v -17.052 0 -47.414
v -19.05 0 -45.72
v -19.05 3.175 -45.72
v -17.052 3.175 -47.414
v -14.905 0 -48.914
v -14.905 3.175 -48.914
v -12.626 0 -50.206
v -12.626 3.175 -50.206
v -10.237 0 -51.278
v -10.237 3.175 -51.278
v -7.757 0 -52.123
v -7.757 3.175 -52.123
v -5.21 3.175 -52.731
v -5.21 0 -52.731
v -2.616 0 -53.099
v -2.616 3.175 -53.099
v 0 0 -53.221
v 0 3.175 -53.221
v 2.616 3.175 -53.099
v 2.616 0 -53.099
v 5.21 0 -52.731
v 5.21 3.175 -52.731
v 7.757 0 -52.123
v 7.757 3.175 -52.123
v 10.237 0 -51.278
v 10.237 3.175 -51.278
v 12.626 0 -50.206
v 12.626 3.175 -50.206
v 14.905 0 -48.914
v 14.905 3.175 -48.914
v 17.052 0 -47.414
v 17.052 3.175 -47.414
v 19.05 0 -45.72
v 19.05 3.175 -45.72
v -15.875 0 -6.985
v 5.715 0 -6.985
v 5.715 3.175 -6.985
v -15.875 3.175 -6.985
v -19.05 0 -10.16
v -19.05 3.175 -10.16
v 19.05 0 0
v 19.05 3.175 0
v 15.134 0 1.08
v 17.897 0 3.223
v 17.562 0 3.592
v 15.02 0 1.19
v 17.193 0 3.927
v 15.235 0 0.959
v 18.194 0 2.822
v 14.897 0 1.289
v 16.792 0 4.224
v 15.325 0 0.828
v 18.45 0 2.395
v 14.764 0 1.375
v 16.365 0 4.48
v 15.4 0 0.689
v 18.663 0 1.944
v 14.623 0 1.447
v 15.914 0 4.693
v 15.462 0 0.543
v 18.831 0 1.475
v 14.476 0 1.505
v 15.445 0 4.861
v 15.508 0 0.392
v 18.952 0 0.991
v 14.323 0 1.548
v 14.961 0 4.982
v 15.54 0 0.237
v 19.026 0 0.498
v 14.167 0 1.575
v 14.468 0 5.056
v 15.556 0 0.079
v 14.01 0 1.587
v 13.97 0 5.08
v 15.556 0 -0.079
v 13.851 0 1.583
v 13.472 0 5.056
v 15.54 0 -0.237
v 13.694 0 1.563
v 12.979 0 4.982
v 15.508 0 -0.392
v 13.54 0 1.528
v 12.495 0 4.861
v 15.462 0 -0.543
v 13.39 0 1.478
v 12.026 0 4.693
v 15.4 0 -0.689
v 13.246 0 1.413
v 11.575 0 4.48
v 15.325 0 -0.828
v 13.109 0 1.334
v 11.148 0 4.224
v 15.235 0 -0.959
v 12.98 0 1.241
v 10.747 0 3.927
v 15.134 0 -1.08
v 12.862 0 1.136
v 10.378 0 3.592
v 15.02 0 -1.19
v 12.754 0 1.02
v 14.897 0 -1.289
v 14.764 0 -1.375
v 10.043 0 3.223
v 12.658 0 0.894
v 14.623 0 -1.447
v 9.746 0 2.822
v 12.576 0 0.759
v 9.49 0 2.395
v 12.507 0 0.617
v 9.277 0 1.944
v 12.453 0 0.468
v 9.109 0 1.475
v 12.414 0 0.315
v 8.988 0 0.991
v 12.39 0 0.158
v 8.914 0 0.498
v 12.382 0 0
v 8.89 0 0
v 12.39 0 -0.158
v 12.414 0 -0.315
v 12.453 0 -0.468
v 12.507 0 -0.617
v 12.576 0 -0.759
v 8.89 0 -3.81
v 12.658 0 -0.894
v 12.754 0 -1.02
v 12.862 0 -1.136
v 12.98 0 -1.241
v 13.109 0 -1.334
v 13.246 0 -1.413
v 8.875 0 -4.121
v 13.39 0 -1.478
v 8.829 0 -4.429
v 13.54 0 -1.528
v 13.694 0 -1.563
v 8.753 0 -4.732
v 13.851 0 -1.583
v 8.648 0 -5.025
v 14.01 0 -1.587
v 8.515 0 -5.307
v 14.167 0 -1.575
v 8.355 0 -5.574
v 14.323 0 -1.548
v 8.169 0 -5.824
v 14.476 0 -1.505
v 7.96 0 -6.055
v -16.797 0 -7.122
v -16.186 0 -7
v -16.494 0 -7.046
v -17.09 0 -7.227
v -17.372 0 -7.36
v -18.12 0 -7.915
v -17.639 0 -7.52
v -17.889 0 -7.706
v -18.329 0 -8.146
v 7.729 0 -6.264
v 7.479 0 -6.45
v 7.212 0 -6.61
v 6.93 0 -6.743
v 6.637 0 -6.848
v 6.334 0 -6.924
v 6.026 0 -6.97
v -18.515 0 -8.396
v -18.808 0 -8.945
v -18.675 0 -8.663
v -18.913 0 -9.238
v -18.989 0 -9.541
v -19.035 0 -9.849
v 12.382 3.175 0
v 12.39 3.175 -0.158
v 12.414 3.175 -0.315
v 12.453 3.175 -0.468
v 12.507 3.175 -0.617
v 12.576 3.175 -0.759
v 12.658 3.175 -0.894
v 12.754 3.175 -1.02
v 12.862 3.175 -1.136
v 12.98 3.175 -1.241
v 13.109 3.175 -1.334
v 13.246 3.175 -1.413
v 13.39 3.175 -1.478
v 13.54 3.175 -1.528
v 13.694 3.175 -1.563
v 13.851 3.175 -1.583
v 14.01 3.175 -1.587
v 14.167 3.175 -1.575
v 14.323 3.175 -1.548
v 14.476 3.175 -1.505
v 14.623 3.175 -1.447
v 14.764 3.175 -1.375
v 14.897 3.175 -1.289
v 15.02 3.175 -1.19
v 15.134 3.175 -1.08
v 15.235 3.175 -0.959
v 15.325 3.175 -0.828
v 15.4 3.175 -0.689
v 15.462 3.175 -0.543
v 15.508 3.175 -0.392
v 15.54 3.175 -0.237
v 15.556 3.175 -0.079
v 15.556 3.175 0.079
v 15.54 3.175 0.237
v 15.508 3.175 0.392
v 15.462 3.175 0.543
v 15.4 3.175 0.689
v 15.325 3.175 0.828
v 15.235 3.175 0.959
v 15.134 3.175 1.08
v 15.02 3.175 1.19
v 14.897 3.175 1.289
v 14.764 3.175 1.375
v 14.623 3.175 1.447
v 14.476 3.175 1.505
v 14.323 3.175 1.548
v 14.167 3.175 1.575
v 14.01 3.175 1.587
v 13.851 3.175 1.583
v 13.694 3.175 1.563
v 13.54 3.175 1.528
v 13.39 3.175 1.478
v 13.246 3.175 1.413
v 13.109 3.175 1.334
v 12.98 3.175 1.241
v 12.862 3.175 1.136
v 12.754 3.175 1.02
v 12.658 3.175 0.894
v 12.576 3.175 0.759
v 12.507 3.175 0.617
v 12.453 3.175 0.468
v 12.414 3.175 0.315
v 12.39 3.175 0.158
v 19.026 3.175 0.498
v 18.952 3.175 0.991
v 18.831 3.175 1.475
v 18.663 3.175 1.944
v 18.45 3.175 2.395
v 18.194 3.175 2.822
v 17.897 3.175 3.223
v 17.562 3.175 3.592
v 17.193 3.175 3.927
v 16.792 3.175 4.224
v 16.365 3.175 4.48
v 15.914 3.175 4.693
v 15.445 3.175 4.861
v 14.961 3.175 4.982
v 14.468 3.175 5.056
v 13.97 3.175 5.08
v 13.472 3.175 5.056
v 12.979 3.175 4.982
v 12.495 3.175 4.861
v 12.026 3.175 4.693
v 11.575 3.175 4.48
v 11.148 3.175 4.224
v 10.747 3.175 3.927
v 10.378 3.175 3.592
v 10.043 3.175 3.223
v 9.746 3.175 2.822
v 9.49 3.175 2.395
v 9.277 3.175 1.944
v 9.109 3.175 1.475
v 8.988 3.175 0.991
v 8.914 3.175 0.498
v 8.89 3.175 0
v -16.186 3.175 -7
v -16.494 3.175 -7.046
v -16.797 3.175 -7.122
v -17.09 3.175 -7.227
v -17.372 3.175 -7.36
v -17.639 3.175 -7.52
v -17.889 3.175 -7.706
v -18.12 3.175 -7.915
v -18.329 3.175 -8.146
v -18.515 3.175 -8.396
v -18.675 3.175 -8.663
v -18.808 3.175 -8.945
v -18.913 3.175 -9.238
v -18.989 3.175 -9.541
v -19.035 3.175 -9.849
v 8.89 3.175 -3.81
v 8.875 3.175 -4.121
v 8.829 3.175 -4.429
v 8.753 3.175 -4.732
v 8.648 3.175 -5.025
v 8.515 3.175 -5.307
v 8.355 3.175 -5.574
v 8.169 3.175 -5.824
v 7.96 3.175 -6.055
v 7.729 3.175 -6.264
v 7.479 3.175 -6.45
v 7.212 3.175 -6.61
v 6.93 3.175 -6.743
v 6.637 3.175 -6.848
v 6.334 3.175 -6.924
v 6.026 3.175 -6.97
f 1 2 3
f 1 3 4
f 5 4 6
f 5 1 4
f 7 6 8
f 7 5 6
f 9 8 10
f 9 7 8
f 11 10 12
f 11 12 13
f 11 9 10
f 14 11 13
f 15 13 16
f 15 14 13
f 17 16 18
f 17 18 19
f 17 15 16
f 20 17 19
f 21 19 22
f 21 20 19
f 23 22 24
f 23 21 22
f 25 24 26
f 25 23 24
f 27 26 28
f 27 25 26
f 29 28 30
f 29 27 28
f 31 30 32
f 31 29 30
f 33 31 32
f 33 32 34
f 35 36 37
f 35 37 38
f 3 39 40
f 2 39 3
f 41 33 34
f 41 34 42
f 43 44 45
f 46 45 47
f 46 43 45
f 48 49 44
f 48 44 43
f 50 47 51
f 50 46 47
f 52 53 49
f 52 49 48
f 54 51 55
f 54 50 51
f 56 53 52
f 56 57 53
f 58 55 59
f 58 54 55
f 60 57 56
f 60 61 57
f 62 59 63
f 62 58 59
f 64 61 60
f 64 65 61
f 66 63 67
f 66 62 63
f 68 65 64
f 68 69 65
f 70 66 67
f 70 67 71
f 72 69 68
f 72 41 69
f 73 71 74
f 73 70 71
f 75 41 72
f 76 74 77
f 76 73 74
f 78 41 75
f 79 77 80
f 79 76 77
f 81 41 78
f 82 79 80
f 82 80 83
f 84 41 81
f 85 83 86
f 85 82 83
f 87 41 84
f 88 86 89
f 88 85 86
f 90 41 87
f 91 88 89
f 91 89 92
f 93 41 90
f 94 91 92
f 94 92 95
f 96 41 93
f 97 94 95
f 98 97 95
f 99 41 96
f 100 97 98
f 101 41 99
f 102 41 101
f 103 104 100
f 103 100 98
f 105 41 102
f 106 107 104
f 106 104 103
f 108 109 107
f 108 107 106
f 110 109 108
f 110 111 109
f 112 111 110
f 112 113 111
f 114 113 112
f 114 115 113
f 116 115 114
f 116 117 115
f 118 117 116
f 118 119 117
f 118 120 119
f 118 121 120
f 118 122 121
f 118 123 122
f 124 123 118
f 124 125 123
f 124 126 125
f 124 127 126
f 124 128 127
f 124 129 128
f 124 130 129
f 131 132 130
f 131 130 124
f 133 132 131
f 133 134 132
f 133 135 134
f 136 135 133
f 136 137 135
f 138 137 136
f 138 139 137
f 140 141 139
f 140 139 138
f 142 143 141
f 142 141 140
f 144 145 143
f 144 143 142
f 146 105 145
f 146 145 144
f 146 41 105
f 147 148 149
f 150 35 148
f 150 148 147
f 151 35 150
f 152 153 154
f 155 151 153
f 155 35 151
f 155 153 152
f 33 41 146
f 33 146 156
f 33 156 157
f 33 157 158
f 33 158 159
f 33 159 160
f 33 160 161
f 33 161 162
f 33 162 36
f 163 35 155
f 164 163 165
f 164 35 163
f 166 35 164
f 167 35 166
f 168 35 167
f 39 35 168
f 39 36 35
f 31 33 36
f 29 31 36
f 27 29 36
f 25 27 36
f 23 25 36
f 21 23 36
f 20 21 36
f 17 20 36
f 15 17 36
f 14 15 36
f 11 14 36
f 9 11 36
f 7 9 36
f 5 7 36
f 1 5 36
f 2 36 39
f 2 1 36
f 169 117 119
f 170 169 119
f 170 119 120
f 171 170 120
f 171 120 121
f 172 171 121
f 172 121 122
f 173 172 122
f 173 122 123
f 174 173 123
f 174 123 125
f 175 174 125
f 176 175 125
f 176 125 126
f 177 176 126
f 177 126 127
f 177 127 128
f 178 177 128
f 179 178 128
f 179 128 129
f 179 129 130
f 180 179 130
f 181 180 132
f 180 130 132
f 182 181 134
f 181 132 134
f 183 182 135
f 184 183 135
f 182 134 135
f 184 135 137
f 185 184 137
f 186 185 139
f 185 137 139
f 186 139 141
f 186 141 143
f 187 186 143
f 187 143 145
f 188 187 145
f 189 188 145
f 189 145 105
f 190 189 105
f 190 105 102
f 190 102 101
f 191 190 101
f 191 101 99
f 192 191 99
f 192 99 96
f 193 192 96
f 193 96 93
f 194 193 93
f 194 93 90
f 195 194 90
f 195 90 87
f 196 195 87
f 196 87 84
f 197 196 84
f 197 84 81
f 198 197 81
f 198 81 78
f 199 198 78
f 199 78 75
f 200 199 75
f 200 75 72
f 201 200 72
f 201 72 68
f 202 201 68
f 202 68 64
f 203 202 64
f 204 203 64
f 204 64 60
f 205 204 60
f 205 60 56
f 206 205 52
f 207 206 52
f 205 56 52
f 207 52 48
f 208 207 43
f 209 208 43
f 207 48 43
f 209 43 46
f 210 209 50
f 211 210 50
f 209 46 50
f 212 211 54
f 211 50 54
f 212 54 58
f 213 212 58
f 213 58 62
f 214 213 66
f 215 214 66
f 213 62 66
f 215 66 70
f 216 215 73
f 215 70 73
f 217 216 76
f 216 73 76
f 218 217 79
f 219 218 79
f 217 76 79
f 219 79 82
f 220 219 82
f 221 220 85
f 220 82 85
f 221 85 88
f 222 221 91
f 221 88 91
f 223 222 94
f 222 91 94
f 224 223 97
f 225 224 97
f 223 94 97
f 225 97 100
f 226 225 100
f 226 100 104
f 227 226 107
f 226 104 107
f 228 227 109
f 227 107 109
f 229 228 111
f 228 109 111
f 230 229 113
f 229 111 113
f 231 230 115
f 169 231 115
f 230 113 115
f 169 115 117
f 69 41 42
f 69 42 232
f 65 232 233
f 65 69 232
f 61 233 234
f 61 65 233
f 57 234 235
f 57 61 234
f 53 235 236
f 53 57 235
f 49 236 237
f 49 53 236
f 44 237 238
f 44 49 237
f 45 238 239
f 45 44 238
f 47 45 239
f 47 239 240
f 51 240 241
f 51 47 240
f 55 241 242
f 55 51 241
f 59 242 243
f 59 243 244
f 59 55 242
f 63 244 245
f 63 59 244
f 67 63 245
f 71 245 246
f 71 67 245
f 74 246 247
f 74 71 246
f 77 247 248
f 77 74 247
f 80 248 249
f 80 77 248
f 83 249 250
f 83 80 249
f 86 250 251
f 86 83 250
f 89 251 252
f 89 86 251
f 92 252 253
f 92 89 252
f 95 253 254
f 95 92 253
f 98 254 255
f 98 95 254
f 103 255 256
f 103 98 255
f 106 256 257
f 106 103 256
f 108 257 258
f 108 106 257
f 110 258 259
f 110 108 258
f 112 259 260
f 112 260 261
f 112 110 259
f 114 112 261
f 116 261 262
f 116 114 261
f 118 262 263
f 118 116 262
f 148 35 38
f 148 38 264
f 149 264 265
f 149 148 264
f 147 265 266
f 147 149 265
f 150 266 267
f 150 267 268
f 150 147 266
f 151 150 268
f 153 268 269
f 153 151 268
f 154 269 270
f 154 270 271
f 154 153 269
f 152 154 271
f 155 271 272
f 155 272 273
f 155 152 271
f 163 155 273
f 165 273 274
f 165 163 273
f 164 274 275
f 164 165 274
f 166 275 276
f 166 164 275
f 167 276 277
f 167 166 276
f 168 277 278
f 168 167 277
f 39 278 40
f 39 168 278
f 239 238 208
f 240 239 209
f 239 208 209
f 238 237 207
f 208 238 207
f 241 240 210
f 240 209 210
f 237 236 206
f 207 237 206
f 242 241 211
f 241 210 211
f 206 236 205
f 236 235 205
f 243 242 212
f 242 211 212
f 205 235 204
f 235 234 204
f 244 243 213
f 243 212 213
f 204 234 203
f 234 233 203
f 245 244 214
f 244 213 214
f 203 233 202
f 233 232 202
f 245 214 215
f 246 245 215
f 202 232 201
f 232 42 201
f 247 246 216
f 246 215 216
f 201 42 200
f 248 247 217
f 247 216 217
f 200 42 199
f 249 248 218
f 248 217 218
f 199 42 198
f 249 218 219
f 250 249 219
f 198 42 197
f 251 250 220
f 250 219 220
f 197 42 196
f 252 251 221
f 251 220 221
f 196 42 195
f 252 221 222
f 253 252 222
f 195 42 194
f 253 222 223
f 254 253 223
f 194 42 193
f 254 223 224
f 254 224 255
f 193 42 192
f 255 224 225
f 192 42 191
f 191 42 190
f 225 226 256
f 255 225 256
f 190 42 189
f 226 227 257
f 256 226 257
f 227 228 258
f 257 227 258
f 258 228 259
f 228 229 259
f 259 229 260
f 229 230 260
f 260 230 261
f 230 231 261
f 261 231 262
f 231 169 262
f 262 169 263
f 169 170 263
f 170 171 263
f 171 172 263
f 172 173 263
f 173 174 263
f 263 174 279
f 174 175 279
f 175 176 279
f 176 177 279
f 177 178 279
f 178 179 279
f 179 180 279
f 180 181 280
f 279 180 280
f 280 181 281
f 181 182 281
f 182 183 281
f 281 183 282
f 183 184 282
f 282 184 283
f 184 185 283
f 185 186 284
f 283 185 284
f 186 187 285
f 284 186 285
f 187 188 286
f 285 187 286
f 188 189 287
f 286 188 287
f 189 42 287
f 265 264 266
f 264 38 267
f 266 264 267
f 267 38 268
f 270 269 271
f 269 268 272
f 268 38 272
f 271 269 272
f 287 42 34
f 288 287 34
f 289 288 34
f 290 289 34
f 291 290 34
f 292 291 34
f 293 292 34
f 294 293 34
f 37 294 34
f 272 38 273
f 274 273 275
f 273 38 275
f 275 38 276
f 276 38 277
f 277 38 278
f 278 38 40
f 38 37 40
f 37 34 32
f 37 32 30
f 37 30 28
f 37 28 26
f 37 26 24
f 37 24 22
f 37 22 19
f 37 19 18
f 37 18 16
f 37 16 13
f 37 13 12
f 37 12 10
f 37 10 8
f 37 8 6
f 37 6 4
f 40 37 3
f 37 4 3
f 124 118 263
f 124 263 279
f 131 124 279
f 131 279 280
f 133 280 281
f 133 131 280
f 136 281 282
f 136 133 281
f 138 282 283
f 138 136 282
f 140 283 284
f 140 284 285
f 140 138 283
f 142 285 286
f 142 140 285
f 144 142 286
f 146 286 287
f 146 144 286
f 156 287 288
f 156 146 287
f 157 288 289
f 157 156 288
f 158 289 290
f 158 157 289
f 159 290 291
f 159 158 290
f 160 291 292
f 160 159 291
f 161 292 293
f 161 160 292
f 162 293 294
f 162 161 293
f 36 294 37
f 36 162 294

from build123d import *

# Parameters (mm, degrees)
BOSS_EXTRUDE1_DEPTH        = 3.175
F_1_8_0_1250_DOWEL_HOLE1_D = 3.175
F_1_8_0_1250_DOWEL_HOLE2_D = 3.175


with BuildPart() as part:
    # Sketch1 → Boss-Extrude1 (new body)
    with BuildSketch(Plane(origin=(0, 0, 0), x_dir=(1, 0, 0), z_dir=(0, 1, 0))):
        with BuildLine():
            Line((-19.05, 10.16), (-19.05, 45.72))
            ThreePointArc((-19.05, 45.72), (0, 53.221284287), (19.05, 45.72))
            Line((19.05, 45.72), (19.05, 10.16))
            Line((19.05, 10.16), (19.05, 0))
            ThreePointArc((19.05, 0), (13.97, -5.08), (8.89, 0))
            Line((8.89, 0), (8.89, 3.81))
            ThreePointArc((8.89, 3.81), (7.96006403, 6.05506403), (5.715, 6.985))
            Line((5.715, 6.985), (-15.875, 6.985))
            ThreePointArc((-15.875, 6.985), (-18.12006403, 7.91493597), (-19.05, 10.16))
        make_face()
    extrude(amount=BOSS_EXTRUDE1_DEPTH)

    # 1/8 (0.1250) Dowel Hole1 (through all)
    with Locations(Plane(origin=(0, 3.175, 0), x_dir=(1, 0, 0), z_dir=(0, 1, 0))):
        with Locations((13.97, 0)):
            Hole(F_1_8_0_1250_DOWEL_HOLE1_D / 2)

    # 1/8 (0.1250) Dowel Hole2 (through all)
    with Locations(Plane(origin=(0, 3.175, 0), x_dir=(1, 0, 0), z_dir=(0, 1, 0))):
        with Locations((-16.306687583, 55.676687583)):
            Hole(F_1_8_0_1250_DOWEL_HOLE2_D / 2)


solid = part.part
